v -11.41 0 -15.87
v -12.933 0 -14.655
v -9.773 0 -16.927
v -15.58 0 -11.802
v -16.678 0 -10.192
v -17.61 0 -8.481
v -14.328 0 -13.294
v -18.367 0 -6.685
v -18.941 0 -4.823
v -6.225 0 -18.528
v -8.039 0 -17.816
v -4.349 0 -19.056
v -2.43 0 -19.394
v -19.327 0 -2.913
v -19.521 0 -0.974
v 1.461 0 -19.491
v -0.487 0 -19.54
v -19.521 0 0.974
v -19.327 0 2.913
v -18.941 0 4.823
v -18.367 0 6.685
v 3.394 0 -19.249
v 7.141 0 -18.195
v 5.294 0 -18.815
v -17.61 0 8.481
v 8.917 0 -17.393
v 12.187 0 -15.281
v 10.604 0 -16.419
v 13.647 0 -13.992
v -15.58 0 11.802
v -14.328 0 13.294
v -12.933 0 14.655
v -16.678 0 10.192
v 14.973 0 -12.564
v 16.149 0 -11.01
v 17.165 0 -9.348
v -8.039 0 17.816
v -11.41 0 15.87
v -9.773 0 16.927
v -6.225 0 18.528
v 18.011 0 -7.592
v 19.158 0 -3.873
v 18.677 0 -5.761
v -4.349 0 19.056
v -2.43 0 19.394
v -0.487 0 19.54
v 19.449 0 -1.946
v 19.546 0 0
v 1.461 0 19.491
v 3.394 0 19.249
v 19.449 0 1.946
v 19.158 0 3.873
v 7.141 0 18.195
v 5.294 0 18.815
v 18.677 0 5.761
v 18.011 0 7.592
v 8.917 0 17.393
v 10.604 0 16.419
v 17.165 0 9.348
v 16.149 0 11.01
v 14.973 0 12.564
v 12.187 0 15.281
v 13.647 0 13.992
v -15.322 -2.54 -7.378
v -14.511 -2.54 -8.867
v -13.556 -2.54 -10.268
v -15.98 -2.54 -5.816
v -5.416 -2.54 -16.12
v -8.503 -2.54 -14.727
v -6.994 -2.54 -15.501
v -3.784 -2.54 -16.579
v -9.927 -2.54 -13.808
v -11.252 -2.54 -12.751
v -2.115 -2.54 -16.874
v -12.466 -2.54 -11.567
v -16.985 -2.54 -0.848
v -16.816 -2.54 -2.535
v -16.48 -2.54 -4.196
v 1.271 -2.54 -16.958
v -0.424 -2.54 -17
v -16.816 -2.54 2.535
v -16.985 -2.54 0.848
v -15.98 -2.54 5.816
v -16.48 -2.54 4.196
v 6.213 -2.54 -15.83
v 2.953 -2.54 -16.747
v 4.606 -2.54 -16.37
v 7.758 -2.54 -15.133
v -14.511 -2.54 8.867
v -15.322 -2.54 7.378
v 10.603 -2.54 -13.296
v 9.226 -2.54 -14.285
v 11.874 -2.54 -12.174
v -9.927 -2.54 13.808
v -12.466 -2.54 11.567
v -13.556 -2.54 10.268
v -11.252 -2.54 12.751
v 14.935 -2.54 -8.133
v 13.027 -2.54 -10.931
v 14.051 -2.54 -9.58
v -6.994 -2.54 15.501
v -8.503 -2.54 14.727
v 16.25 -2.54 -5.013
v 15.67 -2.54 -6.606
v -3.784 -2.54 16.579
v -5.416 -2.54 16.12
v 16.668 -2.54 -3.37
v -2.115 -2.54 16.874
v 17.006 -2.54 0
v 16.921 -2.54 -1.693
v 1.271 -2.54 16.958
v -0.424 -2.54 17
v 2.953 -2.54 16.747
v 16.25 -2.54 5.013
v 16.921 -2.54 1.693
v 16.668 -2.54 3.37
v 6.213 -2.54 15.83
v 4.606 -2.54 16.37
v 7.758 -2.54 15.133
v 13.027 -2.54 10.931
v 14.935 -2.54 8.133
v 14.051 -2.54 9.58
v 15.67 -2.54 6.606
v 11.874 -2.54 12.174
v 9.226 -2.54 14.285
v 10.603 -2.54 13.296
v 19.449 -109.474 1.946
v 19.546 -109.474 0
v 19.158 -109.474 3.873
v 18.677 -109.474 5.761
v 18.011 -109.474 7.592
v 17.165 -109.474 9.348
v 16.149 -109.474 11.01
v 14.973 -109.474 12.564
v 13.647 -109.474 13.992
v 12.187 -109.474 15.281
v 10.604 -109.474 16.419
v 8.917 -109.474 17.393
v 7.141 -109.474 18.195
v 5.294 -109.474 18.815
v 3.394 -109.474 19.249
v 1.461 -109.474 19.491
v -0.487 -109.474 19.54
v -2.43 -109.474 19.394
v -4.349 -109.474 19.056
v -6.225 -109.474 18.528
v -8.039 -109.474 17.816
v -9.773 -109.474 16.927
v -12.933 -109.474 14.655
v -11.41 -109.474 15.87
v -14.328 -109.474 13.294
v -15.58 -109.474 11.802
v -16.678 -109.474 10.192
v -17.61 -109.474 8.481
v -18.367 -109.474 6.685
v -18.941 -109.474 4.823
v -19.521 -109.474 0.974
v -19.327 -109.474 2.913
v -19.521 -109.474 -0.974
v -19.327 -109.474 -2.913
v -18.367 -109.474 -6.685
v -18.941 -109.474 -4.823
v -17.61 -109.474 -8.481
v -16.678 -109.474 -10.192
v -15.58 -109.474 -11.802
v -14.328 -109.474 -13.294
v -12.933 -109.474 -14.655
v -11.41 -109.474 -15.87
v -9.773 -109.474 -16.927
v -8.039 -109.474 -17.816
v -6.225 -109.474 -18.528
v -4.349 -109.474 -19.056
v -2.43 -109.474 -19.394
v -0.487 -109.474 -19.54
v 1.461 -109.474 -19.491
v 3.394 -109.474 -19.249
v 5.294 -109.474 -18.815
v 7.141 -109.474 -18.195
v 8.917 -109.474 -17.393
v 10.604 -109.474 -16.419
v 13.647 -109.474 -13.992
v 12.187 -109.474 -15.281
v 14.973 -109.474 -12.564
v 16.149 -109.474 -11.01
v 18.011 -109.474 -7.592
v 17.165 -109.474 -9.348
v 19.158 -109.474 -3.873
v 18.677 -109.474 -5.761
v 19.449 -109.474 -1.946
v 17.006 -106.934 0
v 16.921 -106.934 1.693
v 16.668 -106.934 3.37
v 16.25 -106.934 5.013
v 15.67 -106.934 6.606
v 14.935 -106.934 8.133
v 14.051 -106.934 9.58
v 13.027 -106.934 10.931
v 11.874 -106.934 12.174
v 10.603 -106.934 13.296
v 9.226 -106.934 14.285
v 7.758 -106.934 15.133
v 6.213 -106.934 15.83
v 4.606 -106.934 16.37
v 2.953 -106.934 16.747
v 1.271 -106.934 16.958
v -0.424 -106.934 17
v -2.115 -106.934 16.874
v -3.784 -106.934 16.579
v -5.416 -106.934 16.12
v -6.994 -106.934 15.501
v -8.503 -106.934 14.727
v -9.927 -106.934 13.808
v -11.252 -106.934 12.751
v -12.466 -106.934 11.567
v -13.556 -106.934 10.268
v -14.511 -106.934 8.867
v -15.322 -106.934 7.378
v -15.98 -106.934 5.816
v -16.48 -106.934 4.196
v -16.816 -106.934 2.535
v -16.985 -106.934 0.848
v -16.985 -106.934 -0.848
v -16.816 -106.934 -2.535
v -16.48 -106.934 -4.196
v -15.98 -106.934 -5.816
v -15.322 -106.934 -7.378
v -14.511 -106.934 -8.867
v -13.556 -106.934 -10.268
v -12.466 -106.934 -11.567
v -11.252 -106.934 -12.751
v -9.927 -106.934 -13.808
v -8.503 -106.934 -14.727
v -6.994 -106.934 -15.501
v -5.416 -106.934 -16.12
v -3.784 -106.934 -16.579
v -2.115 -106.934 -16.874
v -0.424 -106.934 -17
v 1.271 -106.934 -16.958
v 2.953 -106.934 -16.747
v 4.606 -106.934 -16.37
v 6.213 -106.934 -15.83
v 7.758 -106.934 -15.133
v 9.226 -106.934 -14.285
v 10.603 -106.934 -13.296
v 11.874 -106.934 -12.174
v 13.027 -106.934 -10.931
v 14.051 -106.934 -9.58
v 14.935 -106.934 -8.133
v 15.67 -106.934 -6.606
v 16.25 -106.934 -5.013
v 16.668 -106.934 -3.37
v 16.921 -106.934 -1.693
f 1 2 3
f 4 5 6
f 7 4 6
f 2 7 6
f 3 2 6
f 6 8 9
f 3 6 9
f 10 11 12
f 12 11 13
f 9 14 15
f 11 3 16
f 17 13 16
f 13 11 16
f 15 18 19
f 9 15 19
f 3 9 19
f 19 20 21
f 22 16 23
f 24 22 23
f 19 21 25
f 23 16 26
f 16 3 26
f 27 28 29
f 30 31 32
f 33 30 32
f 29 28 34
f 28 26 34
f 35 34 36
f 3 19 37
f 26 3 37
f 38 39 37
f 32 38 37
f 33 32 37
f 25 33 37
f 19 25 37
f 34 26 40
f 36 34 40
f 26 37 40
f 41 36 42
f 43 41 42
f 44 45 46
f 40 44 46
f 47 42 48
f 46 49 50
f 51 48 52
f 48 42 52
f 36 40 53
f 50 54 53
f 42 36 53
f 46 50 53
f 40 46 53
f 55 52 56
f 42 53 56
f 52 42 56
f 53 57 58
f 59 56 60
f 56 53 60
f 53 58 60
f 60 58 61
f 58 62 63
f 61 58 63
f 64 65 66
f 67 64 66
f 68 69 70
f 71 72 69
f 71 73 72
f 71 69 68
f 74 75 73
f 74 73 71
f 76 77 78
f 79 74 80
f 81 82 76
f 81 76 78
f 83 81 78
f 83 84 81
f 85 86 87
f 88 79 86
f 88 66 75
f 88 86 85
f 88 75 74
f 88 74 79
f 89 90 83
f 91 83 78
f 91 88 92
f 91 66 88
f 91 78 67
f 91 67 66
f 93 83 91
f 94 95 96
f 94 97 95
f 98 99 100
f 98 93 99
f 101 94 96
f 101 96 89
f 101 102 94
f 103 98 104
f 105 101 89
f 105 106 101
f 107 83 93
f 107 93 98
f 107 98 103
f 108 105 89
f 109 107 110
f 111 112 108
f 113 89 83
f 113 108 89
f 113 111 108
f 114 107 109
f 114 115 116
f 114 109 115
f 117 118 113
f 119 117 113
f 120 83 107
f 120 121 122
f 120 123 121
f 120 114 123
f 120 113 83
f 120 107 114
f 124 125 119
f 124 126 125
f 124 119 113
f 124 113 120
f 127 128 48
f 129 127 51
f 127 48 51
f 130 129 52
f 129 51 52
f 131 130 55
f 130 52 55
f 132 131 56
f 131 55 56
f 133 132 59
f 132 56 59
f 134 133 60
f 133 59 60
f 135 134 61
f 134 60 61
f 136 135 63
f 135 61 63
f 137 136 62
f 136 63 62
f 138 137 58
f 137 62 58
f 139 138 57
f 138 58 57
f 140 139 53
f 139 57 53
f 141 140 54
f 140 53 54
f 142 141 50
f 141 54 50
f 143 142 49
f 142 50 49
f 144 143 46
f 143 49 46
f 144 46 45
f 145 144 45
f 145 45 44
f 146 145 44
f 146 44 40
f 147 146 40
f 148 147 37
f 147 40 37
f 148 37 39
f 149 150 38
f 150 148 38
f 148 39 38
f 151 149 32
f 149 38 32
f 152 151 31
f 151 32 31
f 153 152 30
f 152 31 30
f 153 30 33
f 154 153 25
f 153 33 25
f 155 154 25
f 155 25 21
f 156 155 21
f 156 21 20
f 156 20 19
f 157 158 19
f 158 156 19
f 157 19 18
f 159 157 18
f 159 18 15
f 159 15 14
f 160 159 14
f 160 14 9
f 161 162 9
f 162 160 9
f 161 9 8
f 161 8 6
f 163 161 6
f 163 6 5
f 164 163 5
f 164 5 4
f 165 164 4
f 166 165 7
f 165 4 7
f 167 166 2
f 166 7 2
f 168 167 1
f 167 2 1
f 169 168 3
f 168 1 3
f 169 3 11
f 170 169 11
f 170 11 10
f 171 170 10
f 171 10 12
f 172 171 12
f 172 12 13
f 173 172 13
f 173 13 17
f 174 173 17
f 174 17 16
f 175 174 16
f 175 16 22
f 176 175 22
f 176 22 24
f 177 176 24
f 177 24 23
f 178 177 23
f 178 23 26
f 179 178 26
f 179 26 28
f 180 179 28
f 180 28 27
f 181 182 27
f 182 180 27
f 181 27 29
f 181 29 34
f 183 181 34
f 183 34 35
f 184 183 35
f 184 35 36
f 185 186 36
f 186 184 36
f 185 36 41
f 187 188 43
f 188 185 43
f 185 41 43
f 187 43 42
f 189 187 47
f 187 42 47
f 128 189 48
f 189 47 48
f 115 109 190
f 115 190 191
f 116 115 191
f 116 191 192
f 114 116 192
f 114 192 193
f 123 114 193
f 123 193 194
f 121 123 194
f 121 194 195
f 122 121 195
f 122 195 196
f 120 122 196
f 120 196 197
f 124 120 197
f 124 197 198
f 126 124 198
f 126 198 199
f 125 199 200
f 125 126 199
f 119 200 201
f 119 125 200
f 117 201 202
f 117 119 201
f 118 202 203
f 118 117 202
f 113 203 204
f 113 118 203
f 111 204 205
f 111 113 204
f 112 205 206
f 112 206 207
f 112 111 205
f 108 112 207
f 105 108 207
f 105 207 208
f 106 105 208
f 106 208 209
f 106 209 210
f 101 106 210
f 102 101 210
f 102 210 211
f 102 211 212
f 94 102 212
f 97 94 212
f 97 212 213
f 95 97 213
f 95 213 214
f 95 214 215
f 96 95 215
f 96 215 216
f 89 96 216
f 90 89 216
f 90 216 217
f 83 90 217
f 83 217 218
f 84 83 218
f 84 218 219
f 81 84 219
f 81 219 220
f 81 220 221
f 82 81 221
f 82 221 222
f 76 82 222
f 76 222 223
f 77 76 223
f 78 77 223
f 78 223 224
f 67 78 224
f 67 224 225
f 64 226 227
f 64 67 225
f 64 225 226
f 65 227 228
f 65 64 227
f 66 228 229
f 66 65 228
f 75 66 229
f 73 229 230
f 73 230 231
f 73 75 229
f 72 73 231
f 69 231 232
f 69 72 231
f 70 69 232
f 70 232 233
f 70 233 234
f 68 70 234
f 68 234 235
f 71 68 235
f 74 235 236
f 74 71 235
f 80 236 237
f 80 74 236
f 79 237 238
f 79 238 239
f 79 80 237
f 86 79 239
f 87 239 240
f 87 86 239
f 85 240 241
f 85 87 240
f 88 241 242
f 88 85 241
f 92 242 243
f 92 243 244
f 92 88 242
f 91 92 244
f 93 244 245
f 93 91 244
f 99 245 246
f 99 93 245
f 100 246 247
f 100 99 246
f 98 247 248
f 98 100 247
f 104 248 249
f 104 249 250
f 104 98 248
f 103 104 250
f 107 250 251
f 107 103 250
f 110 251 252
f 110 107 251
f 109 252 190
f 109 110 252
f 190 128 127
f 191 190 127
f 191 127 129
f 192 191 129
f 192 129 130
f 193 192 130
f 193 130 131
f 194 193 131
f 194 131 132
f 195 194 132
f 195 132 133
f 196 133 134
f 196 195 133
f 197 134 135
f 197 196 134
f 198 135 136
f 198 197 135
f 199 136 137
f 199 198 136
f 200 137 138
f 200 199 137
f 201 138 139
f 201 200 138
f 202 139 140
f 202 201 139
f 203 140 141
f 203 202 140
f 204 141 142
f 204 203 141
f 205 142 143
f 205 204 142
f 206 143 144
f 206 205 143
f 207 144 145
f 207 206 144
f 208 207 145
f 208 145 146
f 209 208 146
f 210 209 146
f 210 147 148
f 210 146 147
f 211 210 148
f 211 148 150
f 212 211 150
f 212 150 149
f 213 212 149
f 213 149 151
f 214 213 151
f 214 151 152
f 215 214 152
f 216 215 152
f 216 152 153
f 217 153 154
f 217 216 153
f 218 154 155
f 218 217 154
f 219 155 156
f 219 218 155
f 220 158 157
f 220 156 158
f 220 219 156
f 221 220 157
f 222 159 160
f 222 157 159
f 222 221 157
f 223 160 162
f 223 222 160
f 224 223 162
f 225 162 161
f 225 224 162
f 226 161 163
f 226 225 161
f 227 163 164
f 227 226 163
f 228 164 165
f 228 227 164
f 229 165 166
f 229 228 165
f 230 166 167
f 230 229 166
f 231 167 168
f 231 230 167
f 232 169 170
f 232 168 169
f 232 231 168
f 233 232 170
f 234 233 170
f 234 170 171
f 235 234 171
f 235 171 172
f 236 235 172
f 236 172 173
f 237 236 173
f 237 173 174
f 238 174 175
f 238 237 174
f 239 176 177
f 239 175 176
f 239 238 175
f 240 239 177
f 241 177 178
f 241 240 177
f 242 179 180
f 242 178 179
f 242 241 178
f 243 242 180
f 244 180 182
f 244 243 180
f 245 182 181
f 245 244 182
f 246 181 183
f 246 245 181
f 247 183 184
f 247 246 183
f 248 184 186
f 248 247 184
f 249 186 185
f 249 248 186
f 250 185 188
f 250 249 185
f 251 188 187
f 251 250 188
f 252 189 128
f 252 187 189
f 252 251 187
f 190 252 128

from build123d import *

# Parameters (mm, degrees)
F0_R     = 19.5456573821
F1_DEPTH = 112.014
F2_T     = -2.54


# Not quite as in the source:
# - a fillet or chamfer that OpenCascade refuses, or shapes differently, is made with other operations: its cross-section is extruded or revolved along the edge and cut away or added


with BuildPart() as f1:
    # F0 (on Front) → F1 (new body)
    with BuildSketch(Plane.XZ):
        Circle(F0_R)
    extrude(amount=F1_DEPTH)

    # F2
    f2_openings = [f1.faces().sort_by_distance(p)[0] for p in [
        (0, -112.014, 0),
    ]]
    offset(amount=F2_T, openings=f2_openings)

    # F3: chamfer of 5.08 on 1 edges, made by hand

    # F3_s1 → F3_t2 (revolve, cut)
    with BuildSketch(Plane.XY):
        Polygon((22.0856573821, -112.014), (17.0056573821, -106.934), (17.0056573821, -112.014), align=None)
    revolve(axis=Axis((0, -112.014, 0), (0, -1, 0)), mode=Mode.SUBTRACT)


solid = f1.part
